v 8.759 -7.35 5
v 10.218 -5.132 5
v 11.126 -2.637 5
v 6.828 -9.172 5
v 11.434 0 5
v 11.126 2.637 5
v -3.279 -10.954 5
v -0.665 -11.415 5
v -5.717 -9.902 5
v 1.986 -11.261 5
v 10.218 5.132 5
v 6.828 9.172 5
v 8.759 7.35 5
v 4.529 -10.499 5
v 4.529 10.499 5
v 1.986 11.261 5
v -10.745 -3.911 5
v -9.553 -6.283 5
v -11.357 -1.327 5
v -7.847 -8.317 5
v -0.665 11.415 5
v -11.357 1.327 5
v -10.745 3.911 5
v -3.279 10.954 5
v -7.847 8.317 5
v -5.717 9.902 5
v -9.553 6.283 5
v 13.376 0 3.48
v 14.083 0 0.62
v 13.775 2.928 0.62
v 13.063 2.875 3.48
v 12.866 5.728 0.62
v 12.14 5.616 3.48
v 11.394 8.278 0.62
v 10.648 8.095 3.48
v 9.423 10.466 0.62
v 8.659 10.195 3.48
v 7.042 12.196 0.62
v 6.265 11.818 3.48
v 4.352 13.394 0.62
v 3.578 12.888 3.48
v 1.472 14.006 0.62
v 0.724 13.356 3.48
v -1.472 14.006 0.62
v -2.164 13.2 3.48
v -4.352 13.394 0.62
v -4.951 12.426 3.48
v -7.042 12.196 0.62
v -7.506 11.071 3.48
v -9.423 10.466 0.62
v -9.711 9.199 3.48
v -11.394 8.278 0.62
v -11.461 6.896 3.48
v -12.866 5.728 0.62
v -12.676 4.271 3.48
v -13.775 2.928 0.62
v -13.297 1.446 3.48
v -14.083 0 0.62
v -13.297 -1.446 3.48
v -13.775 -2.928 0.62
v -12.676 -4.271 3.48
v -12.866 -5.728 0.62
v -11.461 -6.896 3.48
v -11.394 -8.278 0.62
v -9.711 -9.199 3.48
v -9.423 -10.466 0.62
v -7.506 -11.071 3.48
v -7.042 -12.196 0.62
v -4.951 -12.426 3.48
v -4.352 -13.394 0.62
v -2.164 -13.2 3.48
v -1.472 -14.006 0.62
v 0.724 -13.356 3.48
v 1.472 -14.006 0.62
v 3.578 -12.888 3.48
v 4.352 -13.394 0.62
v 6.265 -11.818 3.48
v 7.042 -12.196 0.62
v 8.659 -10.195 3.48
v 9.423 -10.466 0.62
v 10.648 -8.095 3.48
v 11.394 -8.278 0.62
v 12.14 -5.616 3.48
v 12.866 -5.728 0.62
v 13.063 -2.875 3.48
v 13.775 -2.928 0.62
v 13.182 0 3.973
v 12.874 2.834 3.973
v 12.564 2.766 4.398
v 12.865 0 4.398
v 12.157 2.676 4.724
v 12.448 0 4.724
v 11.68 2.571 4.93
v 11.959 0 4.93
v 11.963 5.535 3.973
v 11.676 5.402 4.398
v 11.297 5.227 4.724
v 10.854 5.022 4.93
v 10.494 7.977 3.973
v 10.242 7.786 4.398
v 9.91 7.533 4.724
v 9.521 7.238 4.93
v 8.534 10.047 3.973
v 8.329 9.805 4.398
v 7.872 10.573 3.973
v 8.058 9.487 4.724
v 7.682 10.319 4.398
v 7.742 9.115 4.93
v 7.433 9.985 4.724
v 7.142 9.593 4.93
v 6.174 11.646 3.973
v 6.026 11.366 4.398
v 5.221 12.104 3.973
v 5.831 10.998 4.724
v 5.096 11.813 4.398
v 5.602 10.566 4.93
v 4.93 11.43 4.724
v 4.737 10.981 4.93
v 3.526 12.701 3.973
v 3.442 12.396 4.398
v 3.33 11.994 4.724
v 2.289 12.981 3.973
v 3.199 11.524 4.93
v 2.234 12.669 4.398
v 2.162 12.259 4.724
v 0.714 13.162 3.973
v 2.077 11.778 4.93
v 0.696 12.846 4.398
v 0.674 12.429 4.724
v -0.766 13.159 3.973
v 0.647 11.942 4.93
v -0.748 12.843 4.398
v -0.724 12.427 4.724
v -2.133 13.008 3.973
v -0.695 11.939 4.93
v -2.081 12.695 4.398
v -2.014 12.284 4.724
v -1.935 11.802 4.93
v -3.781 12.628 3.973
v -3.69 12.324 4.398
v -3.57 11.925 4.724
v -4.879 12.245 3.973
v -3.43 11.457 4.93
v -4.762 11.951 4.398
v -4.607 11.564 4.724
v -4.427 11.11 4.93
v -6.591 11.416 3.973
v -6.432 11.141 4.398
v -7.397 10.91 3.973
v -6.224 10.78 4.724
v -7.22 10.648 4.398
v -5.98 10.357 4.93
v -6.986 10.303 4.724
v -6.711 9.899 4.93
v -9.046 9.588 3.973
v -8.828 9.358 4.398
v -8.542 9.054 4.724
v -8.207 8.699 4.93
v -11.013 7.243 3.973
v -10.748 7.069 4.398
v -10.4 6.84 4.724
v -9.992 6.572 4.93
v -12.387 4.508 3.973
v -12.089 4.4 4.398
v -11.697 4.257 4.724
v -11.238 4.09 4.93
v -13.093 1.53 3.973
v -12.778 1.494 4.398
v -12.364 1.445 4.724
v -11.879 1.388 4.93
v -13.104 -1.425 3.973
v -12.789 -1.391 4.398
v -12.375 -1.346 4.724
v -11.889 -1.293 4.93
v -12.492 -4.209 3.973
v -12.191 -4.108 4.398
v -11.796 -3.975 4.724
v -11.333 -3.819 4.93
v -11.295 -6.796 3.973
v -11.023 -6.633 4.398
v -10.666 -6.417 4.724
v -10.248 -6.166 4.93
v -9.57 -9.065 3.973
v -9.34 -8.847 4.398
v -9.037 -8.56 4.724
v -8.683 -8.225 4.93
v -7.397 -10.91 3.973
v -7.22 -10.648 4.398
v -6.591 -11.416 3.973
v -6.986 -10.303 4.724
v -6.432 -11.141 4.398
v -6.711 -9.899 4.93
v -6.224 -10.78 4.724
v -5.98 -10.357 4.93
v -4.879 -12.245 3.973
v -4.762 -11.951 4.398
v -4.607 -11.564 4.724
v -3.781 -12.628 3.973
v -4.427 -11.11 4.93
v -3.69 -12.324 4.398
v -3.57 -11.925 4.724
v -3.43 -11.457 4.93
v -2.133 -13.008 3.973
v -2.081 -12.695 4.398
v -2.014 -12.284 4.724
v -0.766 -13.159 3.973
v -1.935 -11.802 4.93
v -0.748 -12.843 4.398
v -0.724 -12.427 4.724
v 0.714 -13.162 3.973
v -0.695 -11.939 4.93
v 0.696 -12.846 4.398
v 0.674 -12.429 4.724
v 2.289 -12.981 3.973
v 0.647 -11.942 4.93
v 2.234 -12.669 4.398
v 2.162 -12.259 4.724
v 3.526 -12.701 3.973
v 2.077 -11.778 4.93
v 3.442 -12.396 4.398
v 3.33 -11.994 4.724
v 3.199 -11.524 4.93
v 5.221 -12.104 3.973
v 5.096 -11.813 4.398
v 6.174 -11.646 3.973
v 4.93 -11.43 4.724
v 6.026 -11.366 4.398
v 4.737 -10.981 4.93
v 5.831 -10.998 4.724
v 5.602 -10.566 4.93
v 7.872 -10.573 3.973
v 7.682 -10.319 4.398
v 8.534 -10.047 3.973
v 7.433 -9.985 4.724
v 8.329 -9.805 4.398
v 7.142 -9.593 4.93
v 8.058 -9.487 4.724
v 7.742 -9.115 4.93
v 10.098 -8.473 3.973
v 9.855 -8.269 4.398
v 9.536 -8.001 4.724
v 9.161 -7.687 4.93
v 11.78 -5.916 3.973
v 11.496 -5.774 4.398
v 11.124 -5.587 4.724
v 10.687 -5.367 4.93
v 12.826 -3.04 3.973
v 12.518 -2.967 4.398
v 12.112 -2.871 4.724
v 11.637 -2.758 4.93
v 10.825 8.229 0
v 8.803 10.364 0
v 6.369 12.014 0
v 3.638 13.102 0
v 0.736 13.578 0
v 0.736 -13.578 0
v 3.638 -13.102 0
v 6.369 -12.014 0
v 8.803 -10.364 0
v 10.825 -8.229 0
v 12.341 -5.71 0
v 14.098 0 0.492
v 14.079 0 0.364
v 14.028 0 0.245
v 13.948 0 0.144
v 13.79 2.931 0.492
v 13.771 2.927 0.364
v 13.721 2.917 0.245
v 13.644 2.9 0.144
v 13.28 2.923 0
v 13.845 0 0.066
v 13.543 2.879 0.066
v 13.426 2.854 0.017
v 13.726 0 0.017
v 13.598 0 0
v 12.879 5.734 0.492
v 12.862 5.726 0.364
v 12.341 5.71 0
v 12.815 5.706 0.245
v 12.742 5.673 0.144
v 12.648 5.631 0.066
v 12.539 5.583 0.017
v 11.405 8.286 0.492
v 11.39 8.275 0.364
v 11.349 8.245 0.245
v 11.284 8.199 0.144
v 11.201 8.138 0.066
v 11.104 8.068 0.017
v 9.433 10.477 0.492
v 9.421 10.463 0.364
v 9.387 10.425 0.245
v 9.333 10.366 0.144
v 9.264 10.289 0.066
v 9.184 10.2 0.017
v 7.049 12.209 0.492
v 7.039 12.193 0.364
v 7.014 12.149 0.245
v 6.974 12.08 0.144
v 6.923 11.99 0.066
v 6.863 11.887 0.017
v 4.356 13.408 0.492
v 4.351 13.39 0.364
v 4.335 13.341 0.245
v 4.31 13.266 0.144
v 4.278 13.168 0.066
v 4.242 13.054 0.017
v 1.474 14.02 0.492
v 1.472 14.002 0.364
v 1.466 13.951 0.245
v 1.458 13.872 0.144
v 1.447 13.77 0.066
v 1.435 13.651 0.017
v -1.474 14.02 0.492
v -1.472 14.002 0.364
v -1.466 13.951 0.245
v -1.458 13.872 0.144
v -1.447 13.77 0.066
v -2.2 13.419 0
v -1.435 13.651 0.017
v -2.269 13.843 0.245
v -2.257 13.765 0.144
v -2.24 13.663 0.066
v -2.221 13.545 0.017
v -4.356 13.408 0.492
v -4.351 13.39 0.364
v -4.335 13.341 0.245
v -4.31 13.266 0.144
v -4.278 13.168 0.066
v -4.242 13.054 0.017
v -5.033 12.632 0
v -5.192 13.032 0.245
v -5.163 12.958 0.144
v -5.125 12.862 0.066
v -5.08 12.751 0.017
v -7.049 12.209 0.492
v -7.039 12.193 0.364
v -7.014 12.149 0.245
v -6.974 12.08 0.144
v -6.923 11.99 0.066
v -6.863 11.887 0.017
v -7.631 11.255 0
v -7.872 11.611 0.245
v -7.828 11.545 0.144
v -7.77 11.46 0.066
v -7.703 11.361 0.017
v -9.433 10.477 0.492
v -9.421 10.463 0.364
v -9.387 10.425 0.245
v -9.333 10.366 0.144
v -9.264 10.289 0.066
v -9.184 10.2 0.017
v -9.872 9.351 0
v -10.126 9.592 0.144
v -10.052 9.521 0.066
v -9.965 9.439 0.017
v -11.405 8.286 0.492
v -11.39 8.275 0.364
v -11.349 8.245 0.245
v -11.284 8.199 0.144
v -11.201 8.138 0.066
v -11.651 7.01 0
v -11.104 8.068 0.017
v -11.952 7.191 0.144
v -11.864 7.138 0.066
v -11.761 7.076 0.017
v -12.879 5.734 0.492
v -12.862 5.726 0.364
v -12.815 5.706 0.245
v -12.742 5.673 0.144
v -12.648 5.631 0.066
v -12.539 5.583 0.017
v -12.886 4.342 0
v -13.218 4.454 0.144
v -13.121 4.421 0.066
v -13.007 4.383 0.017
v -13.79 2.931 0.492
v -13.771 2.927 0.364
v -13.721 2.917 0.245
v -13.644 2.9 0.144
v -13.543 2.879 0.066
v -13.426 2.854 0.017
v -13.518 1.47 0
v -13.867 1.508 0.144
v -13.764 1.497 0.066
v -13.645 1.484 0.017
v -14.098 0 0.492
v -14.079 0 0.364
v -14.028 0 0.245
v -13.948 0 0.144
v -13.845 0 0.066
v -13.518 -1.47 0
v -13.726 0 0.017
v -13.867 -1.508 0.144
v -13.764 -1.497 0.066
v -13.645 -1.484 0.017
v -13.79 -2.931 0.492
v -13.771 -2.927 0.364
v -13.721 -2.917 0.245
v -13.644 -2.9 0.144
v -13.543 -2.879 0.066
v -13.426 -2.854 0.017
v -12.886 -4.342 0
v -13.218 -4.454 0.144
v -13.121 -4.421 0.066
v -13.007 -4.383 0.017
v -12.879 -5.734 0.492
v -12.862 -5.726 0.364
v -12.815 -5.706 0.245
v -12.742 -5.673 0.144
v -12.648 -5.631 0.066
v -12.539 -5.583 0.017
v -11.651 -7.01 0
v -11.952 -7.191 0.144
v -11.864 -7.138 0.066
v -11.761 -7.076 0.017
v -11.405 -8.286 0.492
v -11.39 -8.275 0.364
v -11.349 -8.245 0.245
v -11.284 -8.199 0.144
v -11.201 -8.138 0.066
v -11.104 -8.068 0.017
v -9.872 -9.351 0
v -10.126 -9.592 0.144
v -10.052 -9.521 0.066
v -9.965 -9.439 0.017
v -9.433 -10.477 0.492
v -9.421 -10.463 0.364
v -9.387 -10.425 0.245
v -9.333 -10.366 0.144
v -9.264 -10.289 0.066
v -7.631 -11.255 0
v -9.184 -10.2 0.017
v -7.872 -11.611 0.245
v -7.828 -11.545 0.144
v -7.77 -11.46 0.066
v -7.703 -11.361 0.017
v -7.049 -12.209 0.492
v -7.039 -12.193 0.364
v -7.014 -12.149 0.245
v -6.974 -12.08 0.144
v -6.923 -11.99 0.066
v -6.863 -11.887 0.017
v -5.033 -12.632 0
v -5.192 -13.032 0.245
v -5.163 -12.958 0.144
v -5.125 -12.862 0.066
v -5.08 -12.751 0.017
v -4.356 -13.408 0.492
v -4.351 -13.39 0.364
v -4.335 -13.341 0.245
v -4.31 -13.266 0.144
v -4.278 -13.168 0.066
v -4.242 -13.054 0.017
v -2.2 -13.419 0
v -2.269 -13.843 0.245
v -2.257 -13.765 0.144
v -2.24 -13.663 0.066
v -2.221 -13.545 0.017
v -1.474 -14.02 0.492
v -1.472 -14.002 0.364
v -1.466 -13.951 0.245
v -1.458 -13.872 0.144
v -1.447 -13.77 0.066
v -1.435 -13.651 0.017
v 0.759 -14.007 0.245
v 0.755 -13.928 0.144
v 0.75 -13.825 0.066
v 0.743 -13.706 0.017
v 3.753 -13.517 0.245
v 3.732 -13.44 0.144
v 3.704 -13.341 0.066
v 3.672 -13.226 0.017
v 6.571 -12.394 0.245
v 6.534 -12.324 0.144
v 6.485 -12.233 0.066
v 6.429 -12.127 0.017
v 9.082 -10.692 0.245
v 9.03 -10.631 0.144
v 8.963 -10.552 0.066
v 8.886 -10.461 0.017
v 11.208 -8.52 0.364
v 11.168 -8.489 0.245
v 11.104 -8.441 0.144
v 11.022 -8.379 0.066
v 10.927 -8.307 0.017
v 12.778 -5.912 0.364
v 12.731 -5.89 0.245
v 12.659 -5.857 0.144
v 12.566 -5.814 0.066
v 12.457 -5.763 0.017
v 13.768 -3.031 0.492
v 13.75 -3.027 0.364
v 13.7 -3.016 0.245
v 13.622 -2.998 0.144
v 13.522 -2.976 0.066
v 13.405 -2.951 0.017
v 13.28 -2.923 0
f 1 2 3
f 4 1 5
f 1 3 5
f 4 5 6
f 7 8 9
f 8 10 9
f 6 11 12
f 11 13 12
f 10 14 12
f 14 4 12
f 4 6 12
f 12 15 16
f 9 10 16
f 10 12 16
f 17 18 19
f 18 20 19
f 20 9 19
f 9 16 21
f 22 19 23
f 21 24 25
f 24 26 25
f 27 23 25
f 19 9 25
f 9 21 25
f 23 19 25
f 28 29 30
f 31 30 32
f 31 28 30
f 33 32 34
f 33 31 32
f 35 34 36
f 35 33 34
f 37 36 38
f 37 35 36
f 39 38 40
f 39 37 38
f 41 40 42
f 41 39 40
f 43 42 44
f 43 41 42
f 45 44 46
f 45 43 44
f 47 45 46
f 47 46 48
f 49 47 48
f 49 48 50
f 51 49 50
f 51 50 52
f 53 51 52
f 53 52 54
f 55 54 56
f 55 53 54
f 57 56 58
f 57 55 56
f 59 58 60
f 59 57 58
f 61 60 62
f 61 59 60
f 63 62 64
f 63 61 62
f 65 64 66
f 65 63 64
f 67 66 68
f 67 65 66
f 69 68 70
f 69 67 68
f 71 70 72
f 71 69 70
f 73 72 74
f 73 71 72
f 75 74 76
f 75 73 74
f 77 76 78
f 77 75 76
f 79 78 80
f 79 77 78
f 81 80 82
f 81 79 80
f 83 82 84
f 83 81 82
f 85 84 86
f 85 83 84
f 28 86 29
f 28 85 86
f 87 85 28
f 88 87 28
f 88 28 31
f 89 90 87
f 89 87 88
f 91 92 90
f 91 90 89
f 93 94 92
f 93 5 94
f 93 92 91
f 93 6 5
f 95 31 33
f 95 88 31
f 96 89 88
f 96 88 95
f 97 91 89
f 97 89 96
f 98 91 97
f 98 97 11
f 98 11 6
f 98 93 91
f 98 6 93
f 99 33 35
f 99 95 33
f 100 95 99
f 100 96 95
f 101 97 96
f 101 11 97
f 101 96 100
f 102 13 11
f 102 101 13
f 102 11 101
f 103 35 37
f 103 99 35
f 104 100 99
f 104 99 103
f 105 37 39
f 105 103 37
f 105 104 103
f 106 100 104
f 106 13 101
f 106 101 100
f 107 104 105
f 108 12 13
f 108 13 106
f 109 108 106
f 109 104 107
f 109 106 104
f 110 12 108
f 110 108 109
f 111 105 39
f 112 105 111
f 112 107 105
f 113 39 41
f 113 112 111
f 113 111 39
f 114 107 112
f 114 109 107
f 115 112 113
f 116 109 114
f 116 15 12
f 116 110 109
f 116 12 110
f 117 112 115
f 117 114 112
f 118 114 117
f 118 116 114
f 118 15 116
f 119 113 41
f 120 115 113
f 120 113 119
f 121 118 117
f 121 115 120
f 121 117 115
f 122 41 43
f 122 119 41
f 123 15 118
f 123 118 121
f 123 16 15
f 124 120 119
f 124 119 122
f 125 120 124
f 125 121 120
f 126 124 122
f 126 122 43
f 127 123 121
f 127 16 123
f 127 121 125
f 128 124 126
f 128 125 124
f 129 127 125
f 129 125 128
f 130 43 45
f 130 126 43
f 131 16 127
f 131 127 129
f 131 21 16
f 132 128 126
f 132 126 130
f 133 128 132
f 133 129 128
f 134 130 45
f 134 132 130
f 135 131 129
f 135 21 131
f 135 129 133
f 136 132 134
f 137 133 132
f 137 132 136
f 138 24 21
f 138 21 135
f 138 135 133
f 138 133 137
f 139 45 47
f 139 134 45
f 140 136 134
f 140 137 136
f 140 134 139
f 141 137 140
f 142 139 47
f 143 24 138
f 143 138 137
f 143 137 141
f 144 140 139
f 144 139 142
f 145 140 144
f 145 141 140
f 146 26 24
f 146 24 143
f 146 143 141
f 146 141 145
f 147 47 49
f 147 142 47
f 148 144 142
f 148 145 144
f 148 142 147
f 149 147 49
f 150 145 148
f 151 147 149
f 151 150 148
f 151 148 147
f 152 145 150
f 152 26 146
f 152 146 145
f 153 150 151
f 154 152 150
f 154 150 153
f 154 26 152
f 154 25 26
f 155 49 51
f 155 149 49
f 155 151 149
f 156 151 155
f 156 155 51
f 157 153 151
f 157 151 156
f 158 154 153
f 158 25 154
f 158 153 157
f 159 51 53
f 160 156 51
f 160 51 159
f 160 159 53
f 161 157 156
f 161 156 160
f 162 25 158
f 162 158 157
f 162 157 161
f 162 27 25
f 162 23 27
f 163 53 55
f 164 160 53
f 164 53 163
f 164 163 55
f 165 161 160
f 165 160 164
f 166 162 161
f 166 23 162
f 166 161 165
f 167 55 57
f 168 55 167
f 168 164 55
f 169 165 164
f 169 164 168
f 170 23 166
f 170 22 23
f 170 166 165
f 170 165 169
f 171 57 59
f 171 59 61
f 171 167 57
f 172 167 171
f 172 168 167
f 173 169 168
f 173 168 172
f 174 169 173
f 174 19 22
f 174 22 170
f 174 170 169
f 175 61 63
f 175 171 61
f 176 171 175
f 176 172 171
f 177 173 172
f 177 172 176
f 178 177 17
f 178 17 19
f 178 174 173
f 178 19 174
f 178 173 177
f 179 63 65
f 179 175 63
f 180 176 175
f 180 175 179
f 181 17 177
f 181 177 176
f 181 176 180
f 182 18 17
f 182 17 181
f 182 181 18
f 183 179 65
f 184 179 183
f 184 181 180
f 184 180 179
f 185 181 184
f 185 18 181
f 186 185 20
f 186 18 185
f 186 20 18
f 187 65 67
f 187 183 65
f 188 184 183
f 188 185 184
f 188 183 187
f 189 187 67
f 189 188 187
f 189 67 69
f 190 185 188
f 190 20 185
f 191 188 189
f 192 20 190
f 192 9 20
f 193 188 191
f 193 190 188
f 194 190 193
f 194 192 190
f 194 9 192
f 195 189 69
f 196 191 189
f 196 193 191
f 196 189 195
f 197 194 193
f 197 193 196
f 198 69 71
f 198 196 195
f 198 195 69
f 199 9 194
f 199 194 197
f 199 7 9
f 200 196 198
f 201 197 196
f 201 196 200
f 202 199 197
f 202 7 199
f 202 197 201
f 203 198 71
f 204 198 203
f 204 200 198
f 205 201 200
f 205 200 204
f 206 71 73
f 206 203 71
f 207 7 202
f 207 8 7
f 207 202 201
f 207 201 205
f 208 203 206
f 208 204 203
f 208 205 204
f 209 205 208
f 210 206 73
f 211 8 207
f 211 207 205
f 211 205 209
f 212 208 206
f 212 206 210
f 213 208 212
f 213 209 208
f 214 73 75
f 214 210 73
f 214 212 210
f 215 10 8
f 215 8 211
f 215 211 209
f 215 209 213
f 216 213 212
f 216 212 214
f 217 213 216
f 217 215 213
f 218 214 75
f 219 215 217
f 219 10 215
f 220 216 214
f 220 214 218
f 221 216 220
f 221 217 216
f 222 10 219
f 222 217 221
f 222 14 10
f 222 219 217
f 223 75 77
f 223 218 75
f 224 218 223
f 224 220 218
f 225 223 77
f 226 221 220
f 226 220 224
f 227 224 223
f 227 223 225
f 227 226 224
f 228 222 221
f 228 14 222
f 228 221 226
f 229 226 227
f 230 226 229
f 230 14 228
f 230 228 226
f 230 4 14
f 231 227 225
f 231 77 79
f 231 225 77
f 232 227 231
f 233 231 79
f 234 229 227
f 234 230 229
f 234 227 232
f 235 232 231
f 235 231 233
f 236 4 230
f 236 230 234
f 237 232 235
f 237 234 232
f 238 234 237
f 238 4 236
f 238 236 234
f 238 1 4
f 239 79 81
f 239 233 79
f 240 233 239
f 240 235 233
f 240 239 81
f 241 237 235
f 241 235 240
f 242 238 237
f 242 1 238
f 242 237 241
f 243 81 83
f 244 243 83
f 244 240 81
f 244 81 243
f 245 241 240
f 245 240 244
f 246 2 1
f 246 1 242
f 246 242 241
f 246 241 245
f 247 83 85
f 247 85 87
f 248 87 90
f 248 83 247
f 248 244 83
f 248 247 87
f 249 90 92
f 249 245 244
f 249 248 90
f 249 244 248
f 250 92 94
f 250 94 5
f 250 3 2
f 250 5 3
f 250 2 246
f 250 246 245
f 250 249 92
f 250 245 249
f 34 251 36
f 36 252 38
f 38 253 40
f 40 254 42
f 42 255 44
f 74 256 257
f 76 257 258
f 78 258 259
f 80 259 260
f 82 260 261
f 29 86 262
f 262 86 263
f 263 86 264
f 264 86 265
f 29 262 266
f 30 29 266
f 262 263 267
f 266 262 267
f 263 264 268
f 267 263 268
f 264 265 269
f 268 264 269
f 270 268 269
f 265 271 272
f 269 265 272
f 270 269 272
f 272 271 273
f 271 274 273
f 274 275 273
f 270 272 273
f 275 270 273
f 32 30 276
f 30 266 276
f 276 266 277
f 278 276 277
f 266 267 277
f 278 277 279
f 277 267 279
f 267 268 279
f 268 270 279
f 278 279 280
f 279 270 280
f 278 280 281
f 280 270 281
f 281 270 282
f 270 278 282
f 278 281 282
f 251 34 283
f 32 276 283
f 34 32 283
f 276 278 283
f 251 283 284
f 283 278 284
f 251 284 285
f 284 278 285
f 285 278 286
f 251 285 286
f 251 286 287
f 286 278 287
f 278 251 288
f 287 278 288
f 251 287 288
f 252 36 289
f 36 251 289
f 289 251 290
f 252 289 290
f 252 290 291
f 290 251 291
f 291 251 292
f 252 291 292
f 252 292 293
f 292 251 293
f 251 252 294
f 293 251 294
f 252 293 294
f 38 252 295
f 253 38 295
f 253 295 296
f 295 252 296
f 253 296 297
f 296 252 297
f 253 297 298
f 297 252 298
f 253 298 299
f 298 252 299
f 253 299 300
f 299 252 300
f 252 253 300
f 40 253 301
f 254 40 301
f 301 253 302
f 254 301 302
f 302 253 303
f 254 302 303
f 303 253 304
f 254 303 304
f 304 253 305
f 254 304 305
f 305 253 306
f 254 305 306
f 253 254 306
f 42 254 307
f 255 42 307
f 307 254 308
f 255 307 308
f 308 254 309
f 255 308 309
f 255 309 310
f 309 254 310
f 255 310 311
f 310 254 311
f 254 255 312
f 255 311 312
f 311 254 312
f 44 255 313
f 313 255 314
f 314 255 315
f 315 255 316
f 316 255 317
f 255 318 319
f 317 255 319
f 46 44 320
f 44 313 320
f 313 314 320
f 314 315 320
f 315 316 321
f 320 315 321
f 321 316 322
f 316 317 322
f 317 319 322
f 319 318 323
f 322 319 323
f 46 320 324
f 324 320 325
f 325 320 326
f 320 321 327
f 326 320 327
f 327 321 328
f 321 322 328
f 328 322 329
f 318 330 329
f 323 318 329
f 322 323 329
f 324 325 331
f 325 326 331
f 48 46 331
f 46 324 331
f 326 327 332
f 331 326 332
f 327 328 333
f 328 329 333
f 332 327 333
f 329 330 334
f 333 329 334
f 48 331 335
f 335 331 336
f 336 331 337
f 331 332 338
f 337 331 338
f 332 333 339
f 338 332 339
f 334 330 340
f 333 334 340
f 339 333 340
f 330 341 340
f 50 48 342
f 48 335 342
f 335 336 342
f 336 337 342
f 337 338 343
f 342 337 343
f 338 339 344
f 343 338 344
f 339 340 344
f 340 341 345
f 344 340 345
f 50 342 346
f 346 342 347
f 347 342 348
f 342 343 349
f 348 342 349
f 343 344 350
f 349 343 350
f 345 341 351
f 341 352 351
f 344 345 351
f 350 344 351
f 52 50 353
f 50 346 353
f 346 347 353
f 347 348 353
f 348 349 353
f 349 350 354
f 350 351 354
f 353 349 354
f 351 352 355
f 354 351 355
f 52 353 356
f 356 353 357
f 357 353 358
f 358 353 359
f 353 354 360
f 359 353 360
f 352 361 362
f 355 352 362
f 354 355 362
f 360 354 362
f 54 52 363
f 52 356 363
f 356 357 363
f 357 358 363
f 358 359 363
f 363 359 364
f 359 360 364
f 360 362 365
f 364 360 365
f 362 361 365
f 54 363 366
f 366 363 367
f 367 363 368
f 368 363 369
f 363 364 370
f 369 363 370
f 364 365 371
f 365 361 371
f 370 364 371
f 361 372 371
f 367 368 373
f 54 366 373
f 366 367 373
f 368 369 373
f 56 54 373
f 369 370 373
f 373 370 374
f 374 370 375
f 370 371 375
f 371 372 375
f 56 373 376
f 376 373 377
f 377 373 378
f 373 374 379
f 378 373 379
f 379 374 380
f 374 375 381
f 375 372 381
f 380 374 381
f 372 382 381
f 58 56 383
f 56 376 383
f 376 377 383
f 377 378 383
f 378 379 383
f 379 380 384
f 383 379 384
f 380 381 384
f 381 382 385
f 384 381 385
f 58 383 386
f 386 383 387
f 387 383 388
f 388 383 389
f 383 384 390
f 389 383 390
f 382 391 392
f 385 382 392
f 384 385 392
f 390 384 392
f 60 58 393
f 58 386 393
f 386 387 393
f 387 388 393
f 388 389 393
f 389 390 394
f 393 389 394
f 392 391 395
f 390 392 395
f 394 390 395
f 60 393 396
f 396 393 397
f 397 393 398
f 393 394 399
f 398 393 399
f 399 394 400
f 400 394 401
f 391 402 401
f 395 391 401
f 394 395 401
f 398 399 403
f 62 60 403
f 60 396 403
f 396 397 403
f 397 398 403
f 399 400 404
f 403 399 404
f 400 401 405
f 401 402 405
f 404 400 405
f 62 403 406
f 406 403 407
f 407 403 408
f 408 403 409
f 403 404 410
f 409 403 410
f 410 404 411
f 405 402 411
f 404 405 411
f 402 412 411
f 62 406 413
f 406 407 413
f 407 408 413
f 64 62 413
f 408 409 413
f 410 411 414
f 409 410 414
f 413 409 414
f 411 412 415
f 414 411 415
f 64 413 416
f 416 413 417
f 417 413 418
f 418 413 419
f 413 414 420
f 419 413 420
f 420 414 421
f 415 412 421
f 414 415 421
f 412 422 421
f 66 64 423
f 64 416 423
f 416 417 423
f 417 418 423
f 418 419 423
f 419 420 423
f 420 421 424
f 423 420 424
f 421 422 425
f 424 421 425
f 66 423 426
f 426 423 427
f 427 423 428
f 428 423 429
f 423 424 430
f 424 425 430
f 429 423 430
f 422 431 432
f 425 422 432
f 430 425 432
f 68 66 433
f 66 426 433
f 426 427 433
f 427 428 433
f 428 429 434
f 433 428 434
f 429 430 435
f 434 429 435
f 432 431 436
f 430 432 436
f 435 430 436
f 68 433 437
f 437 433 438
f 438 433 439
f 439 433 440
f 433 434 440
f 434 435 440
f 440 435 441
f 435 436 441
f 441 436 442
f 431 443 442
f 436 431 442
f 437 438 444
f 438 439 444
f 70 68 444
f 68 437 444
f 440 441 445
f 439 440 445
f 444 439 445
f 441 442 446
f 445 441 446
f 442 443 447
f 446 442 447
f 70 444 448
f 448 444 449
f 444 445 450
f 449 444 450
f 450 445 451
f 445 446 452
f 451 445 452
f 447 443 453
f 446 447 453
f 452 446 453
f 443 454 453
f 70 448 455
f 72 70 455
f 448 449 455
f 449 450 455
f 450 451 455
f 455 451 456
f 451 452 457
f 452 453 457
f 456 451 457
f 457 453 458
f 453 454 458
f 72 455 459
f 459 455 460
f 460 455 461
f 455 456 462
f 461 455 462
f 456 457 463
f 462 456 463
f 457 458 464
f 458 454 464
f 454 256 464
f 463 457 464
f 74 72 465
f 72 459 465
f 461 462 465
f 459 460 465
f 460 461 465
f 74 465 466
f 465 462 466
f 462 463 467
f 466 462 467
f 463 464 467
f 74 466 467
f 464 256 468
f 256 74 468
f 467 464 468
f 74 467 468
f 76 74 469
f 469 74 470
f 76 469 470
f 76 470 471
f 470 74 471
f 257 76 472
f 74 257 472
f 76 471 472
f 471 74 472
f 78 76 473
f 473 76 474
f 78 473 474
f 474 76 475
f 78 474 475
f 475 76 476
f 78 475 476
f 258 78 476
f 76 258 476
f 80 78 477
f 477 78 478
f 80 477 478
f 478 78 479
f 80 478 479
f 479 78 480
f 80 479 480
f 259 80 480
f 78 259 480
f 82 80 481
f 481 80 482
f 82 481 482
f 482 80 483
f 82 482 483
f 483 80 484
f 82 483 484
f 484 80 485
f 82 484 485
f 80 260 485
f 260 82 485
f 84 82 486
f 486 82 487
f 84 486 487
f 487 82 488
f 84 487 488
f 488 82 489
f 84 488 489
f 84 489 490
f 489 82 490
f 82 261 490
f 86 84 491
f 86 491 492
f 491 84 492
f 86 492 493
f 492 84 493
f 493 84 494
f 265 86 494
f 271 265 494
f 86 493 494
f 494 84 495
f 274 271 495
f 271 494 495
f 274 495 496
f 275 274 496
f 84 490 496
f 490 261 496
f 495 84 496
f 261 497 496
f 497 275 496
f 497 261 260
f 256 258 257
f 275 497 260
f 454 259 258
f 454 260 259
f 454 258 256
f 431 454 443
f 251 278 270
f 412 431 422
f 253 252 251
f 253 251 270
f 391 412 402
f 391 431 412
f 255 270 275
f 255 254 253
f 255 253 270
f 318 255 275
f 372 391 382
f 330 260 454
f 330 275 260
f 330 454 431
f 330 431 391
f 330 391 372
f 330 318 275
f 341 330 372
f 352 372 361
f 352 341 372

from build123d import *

# Parameters (mm, degrees)
F0_W = 13
F0_H = 5
F2_R = 2
F3_R = 0.5


with BuildPart() as f1:
    # F0 (on Front) → F1 (revolve)
    with BuildSketch(Plane.XZ):
        with Locations((6.5, 2.5)):
            Rectangle(F0_W, F0_H)
        Polygon((13, 5), (13, 0), (14.236494, 0), align=None)
    revolve(axis=Axis((0, 0, 2.5), (0, 0, 1)))

    # F2
    f2_edges = [f1.edges().sort_by_distance(p)[0] for p in [
        (-13, 0, 5),
    ]]
    fillet(f2_edges, radius=F2_R)

    # F3
    f3_edges = [f1.edges().sort_by_distance(p)[0] for p in [
        (-14.236494, 0, 0),
    ]]
    fillet(f3_edges, radius=F3_R)


solid = f1.part
